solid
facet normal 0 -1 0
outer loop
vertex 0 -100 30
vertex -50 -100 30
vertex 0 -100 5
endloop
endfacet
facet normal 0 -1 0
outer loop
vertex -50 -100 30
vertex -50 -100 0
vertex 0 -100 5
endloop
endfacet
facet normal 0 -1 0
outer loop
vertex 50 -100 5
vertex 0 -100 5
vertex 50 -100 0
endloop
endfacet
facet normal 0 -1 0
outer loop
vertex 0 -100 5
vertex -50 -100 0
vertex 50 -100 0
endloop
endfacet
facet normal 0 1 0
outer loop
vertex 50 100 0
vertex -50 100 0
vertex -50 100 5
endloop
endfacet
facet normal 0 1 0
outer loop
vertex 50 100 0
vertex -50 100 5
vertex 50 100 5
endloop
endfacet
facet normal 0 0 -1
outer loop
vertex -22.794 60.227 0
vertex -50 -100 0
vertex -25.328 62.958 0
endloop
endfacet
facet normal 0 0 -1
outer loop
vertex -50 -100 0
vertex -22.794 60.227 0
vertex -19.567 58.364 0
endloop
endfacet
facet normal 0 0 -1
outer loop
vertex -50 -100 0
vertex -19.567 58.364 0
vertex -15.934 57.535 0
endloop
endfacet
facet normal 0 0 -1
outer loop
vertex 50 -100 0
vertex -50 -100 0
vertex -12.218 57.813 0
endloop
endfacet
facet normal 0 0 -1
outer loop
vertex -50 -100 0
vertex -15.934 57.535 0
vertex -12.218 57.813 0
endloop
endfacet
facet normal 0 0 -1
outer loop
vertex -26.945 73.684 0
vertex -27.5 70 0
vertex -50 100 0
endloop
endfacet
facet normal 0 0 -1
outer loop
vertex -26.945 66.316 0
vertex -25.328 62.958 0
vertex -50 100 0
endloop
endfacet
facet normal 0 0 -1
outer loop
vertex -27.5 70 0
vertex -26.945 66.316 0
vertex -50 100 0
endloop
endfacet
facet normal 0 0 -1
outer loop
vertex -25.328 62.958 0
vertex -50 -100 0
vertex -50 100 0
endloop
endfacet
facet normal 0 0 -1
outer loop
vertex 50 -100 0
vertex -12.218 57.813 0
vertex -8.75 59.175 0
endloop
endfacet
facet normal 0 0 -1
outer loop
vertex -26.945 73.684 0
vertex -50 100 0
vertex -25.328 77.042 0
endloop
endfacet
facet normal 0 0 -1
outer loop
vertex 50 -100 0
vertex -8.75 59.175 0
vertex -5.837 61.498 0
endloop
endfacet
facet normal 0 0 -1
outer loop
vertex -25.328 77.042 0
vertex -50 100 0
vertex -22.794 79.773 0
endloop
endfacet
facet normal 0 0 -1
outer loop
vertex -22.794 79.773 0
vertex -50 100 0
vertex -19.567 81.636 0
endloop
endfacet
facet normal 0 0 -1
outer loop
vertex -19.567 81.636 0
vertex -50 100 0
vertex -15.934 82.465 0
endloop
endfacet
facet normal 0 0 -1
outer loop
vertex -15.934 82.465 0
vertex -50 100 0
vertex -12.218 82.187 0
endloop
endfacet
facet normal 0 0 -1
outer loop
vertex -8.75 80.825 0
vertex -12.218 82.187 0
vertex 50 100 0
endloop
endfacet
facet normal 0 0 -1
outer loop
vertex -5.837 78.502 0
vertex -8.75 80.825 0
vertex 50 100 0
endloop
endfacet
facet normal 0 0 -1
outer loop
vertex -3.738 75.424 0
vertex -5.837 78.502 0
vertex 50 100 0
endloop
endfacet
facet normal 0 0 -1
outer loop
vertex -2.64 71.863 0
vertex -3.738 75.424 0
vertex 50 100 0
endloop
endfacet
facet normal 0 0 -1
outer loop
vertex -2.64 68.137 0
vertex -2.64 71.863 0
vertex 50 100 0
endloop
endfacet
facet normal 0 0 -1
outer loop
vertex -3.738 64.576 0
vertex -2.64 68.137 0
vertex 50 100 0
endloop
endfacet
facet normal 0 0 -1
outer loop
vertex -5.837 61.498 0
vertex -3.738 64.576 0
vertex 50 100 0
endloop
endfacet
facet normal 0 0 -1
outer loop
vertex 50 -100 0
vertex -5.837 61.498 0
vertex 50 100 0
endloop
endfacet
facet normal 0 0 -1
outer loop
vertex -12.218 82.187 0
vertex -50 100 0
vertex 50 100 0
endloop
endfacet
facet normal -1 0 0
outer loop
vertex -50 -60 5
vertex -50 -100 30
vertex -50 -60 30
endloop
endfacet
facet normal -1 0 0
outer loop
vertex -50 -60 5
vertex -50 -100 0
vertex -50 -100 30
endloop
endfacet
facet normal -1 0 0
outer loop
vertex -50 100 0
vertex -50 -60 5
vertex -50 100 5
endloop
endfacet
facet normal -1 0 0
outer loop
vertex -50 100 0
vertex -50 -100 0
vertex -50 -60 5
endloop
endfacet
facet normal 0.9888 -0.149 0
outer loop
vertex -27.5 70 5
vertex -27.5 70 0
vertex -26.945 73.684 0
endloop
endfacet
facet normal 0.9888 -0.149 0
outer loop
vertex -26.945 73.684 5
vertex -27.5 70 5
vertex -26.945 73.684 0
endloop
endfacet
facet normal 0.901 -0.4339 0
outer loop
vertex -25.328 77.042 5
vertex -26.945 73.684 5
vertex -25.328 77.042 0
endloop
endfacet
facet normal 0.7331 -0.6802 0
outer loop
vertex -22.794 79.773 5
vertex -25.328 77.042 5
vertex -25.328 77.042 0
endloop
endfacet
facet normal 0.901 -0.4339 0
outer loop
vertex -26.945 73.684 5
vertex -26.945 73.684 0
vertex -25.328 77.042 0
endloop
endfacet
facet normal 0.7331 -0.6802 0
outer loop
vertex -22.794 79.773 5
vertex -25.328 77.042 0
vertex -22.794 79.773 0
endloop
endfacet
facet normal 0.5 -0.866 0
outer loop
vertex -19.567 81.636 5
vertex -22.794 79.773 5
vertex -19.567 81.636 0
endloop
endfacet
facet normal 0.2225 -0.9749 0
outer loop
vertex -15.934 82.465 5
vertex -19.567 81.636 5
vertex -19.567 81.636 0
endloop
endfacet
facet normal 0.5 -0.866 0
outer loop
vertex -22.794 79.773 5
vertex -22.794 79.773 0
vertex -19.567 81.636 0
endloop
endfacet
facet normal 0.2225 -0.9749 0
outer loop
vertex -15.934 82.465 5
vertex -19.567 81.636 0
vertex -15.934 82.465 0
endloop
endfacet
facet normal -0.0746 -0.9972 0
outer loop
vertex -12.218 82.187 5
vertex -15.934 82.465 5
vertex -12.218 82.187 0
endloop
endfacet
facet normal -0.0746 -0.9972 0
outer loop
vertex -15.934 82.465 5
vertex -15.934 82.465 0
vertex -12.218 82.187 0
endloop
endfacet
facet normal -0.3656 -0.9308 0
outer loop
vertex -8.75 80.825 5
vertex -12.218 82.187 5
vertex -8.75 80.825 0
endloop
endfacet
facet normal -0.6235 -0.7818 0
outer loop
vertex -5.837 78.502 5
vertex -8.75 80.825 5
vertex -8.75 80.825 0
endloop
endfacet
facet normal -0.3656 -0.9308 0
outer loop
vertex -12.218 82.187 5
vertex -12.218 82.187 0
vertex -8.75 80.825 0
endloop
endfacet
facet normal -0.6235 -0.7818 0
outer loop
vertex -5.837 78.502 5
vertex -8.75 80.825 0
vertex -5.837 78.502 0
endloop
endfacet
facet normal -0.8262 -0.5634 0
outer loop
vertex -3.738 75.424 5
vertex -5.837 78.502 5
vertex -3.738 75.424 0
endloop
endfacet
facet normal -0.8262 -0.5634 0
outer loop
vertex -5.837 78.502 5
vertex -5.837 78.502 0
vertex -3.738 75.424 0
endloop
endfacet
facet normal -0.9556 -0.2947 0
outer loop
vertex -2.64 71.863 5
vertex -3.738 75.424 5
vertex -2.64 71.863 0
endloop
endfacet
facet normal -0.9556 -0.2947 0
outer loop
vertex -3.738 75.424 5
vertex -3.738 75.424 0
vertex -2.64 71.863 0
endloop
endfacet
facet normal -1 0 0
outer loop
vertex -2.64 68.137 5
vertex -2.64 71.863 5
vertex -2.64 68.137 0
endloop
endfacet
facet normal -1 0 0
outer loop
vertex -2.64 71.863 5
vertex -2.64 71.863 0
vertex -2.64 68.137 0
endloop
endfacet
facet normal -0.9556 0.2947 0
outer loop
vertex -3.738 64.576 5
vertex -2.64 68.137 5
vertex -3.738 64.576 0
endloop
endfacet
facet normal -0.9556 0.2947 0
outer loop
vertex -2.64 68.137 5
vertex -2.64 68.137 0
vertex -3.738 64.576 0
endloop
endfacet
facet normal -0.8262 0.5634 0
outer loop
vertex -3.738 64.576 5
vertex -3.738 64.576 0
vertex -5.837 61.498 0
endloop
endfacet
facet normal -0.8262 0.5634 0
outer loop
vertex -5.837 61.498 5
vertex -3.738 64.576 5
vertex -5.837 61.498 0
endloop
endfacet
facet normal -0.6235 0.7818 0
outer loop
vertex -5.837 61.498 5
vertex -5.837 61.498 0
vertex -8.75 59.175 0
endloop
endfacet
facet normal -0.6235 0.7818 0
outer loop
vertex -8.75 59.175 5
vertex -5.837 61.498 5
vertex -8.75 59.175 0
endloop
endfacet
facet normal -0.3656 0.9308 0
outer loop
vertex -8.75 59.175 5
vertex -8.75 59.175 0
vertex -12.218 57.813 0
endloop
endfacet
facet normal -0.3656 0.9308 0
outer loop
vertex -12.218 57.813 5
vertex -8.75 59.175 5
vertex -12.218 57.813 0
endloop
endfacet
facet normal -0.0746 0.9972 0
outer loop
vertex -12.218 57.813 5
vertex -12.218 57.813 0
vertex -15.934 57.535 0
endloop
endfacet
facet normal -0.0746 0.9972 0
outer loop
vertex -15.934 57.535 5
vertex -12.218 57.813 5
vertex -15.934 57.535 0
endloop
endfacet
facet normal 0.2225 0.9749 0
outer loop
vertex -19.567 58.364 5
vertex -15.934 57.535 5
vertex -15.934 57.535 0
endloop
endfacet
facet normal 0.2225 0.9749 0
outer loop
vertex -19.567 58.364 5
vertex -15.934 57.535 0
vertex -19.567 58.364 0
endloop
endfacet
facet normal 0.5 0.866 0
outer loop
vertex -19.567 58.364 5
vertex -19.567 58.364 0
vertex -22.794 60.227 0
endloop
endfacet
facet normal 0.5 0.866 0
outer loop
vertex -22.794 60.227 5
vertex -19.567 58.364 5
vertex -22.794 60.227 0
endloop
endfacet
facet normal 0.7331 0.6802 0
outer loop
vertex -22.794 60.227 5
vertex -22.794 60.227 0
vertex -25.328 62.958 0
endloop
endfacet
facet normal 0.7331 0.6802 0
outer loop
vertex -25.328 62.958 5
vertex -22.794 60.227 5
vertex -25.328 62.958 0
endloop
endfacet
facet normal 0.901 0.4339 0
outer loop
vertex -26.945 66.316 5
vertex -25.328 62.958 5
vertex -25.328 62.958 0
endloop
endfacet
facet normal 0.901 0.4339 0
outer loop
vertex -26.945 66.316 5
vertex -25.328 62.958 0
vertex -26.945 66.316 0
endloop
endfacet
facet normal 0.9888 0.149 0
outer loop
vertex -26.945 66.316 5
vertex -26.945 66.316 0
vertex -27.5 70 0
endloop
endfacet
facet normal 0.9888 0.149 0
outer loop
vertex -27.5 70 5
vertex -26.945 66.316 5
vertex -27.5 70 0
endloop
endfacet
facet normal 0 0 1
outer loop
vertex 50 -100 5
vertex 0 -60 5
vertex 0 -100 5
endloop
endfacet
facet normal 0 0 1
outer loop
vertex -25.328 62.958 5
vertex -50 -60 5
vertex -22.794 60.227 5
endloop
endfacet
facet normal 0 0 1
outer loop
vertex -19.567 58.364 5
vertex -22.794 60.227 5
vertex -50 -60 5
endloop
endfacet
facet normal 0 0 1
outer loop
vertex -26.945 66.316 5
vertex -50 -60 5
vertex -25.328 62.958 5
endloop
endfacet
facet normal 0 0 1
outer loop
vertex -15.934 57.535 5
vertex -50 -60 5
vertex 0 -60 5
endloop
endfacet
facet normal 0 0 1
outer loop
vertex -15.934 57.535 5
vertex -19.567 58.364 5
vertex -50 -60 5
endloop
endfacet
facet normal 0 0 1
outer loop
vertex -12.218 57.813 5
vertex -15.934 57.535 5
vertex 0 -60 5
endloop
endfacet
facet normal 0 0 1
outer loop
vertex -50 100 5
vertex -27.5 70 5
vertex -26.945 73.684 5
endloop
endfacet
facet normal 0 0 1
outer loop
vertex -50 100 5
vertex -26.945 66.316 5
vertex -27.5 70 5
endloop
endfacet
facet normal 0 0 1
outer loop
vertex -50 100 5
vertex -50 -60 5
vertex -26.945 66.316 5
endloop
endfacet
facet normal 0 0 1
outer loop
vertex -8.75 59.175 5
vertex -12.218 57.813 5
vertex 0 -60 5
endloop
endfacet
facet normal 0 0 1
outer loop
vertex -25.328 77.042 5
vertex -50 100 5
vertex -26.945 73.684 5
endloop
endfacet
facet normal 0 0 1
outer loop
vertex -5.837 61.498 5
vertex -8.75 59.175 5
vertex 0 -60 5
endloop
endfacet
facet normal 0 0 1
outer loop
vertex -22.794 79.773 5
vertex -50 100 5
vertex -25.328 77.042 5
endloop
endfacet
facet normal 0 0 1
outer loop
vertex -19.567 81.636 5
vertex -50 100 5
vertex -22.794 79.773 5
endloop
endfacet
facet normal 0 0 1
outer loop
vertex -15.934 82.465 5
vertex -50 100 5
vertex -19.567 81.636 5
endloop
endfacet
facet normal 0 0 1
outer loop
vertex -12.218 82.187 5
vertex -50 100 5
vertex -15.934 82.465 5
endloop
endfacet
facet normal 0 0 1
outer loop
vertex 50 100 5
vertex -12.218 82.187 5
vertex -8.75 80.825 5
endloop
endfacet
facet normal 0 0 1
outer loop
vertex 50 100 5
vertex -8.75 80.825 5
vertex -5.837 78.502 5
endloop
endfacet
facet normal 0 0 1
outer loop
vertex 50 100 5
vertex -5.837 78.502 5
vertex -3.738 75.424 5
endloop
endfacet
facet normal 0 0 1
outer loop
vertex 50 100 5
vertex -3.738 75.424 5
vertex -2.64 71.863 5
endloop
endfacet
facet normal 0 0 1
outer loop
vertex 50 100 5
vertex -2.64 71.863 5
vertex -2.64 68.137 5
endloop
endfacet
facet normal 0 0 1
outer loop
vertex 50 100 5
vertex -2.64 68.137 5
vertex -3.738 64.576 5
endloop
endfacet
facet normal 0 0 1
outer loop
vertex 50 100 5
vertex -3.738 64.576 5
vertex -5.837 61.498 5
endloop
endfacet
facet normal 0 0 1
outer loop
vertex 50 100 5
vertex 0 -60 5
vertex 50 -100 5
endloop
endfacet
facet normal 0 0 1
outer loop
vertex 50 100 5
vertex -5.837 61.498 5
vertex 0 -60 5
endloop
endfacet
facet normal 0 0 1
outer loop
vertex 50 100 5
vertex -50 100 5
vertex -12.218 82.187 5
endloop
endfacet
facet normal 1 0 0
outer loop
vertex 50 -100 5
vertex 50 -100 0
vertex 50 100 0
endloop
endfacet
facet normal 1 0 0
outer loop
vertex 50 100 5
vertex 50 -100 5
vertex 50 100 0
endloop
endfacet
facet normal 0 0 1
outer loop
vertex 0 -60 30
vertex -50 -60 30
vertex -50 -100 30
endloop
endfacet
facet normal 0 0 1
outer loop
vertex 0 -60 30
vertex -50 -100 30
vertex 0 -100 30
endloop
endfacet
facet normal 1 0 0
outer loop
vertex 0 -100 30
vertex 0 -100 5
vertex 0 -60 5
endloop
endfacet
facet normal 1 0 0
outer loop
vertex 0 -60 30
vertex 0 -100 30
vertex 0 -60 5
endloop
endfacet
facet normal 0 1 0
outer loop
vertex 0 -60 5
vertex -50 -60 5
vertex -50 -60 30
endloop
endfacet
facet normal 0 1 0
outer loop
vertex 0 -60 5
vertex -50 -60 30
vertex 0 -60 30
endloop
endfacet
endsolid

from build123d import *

# Parameters (mm, degrees)
F0_W     = 100
F0_H     = 200
F1_DEPTH = 5
F2_W     = 50
F2_H     = 40
F3_DEPTH = 25
F5_D     = 25


with BuildPart() as f1:
    # F0 (on Top) → F1 (new body)
    with BuildSketch(Plane.XY):
        Rectangle(F0_W, F0_H)
    extrude(amount=F1_DEPTH)

    # F2 (on face) → F3 (join)
    with BuildSketch(Plane.XY.offset(5)):
        with Locations((-25, -80)):
            Rectangle(F2_W, F2_H)
    extrude(amount=F3_DEPTH)

    # F5 (through all)
    with Locations(Plane.XY.offset(5)):
        with Locations((-15, 70)):
            Hole(F5_D / 2)


solid = f1.part
